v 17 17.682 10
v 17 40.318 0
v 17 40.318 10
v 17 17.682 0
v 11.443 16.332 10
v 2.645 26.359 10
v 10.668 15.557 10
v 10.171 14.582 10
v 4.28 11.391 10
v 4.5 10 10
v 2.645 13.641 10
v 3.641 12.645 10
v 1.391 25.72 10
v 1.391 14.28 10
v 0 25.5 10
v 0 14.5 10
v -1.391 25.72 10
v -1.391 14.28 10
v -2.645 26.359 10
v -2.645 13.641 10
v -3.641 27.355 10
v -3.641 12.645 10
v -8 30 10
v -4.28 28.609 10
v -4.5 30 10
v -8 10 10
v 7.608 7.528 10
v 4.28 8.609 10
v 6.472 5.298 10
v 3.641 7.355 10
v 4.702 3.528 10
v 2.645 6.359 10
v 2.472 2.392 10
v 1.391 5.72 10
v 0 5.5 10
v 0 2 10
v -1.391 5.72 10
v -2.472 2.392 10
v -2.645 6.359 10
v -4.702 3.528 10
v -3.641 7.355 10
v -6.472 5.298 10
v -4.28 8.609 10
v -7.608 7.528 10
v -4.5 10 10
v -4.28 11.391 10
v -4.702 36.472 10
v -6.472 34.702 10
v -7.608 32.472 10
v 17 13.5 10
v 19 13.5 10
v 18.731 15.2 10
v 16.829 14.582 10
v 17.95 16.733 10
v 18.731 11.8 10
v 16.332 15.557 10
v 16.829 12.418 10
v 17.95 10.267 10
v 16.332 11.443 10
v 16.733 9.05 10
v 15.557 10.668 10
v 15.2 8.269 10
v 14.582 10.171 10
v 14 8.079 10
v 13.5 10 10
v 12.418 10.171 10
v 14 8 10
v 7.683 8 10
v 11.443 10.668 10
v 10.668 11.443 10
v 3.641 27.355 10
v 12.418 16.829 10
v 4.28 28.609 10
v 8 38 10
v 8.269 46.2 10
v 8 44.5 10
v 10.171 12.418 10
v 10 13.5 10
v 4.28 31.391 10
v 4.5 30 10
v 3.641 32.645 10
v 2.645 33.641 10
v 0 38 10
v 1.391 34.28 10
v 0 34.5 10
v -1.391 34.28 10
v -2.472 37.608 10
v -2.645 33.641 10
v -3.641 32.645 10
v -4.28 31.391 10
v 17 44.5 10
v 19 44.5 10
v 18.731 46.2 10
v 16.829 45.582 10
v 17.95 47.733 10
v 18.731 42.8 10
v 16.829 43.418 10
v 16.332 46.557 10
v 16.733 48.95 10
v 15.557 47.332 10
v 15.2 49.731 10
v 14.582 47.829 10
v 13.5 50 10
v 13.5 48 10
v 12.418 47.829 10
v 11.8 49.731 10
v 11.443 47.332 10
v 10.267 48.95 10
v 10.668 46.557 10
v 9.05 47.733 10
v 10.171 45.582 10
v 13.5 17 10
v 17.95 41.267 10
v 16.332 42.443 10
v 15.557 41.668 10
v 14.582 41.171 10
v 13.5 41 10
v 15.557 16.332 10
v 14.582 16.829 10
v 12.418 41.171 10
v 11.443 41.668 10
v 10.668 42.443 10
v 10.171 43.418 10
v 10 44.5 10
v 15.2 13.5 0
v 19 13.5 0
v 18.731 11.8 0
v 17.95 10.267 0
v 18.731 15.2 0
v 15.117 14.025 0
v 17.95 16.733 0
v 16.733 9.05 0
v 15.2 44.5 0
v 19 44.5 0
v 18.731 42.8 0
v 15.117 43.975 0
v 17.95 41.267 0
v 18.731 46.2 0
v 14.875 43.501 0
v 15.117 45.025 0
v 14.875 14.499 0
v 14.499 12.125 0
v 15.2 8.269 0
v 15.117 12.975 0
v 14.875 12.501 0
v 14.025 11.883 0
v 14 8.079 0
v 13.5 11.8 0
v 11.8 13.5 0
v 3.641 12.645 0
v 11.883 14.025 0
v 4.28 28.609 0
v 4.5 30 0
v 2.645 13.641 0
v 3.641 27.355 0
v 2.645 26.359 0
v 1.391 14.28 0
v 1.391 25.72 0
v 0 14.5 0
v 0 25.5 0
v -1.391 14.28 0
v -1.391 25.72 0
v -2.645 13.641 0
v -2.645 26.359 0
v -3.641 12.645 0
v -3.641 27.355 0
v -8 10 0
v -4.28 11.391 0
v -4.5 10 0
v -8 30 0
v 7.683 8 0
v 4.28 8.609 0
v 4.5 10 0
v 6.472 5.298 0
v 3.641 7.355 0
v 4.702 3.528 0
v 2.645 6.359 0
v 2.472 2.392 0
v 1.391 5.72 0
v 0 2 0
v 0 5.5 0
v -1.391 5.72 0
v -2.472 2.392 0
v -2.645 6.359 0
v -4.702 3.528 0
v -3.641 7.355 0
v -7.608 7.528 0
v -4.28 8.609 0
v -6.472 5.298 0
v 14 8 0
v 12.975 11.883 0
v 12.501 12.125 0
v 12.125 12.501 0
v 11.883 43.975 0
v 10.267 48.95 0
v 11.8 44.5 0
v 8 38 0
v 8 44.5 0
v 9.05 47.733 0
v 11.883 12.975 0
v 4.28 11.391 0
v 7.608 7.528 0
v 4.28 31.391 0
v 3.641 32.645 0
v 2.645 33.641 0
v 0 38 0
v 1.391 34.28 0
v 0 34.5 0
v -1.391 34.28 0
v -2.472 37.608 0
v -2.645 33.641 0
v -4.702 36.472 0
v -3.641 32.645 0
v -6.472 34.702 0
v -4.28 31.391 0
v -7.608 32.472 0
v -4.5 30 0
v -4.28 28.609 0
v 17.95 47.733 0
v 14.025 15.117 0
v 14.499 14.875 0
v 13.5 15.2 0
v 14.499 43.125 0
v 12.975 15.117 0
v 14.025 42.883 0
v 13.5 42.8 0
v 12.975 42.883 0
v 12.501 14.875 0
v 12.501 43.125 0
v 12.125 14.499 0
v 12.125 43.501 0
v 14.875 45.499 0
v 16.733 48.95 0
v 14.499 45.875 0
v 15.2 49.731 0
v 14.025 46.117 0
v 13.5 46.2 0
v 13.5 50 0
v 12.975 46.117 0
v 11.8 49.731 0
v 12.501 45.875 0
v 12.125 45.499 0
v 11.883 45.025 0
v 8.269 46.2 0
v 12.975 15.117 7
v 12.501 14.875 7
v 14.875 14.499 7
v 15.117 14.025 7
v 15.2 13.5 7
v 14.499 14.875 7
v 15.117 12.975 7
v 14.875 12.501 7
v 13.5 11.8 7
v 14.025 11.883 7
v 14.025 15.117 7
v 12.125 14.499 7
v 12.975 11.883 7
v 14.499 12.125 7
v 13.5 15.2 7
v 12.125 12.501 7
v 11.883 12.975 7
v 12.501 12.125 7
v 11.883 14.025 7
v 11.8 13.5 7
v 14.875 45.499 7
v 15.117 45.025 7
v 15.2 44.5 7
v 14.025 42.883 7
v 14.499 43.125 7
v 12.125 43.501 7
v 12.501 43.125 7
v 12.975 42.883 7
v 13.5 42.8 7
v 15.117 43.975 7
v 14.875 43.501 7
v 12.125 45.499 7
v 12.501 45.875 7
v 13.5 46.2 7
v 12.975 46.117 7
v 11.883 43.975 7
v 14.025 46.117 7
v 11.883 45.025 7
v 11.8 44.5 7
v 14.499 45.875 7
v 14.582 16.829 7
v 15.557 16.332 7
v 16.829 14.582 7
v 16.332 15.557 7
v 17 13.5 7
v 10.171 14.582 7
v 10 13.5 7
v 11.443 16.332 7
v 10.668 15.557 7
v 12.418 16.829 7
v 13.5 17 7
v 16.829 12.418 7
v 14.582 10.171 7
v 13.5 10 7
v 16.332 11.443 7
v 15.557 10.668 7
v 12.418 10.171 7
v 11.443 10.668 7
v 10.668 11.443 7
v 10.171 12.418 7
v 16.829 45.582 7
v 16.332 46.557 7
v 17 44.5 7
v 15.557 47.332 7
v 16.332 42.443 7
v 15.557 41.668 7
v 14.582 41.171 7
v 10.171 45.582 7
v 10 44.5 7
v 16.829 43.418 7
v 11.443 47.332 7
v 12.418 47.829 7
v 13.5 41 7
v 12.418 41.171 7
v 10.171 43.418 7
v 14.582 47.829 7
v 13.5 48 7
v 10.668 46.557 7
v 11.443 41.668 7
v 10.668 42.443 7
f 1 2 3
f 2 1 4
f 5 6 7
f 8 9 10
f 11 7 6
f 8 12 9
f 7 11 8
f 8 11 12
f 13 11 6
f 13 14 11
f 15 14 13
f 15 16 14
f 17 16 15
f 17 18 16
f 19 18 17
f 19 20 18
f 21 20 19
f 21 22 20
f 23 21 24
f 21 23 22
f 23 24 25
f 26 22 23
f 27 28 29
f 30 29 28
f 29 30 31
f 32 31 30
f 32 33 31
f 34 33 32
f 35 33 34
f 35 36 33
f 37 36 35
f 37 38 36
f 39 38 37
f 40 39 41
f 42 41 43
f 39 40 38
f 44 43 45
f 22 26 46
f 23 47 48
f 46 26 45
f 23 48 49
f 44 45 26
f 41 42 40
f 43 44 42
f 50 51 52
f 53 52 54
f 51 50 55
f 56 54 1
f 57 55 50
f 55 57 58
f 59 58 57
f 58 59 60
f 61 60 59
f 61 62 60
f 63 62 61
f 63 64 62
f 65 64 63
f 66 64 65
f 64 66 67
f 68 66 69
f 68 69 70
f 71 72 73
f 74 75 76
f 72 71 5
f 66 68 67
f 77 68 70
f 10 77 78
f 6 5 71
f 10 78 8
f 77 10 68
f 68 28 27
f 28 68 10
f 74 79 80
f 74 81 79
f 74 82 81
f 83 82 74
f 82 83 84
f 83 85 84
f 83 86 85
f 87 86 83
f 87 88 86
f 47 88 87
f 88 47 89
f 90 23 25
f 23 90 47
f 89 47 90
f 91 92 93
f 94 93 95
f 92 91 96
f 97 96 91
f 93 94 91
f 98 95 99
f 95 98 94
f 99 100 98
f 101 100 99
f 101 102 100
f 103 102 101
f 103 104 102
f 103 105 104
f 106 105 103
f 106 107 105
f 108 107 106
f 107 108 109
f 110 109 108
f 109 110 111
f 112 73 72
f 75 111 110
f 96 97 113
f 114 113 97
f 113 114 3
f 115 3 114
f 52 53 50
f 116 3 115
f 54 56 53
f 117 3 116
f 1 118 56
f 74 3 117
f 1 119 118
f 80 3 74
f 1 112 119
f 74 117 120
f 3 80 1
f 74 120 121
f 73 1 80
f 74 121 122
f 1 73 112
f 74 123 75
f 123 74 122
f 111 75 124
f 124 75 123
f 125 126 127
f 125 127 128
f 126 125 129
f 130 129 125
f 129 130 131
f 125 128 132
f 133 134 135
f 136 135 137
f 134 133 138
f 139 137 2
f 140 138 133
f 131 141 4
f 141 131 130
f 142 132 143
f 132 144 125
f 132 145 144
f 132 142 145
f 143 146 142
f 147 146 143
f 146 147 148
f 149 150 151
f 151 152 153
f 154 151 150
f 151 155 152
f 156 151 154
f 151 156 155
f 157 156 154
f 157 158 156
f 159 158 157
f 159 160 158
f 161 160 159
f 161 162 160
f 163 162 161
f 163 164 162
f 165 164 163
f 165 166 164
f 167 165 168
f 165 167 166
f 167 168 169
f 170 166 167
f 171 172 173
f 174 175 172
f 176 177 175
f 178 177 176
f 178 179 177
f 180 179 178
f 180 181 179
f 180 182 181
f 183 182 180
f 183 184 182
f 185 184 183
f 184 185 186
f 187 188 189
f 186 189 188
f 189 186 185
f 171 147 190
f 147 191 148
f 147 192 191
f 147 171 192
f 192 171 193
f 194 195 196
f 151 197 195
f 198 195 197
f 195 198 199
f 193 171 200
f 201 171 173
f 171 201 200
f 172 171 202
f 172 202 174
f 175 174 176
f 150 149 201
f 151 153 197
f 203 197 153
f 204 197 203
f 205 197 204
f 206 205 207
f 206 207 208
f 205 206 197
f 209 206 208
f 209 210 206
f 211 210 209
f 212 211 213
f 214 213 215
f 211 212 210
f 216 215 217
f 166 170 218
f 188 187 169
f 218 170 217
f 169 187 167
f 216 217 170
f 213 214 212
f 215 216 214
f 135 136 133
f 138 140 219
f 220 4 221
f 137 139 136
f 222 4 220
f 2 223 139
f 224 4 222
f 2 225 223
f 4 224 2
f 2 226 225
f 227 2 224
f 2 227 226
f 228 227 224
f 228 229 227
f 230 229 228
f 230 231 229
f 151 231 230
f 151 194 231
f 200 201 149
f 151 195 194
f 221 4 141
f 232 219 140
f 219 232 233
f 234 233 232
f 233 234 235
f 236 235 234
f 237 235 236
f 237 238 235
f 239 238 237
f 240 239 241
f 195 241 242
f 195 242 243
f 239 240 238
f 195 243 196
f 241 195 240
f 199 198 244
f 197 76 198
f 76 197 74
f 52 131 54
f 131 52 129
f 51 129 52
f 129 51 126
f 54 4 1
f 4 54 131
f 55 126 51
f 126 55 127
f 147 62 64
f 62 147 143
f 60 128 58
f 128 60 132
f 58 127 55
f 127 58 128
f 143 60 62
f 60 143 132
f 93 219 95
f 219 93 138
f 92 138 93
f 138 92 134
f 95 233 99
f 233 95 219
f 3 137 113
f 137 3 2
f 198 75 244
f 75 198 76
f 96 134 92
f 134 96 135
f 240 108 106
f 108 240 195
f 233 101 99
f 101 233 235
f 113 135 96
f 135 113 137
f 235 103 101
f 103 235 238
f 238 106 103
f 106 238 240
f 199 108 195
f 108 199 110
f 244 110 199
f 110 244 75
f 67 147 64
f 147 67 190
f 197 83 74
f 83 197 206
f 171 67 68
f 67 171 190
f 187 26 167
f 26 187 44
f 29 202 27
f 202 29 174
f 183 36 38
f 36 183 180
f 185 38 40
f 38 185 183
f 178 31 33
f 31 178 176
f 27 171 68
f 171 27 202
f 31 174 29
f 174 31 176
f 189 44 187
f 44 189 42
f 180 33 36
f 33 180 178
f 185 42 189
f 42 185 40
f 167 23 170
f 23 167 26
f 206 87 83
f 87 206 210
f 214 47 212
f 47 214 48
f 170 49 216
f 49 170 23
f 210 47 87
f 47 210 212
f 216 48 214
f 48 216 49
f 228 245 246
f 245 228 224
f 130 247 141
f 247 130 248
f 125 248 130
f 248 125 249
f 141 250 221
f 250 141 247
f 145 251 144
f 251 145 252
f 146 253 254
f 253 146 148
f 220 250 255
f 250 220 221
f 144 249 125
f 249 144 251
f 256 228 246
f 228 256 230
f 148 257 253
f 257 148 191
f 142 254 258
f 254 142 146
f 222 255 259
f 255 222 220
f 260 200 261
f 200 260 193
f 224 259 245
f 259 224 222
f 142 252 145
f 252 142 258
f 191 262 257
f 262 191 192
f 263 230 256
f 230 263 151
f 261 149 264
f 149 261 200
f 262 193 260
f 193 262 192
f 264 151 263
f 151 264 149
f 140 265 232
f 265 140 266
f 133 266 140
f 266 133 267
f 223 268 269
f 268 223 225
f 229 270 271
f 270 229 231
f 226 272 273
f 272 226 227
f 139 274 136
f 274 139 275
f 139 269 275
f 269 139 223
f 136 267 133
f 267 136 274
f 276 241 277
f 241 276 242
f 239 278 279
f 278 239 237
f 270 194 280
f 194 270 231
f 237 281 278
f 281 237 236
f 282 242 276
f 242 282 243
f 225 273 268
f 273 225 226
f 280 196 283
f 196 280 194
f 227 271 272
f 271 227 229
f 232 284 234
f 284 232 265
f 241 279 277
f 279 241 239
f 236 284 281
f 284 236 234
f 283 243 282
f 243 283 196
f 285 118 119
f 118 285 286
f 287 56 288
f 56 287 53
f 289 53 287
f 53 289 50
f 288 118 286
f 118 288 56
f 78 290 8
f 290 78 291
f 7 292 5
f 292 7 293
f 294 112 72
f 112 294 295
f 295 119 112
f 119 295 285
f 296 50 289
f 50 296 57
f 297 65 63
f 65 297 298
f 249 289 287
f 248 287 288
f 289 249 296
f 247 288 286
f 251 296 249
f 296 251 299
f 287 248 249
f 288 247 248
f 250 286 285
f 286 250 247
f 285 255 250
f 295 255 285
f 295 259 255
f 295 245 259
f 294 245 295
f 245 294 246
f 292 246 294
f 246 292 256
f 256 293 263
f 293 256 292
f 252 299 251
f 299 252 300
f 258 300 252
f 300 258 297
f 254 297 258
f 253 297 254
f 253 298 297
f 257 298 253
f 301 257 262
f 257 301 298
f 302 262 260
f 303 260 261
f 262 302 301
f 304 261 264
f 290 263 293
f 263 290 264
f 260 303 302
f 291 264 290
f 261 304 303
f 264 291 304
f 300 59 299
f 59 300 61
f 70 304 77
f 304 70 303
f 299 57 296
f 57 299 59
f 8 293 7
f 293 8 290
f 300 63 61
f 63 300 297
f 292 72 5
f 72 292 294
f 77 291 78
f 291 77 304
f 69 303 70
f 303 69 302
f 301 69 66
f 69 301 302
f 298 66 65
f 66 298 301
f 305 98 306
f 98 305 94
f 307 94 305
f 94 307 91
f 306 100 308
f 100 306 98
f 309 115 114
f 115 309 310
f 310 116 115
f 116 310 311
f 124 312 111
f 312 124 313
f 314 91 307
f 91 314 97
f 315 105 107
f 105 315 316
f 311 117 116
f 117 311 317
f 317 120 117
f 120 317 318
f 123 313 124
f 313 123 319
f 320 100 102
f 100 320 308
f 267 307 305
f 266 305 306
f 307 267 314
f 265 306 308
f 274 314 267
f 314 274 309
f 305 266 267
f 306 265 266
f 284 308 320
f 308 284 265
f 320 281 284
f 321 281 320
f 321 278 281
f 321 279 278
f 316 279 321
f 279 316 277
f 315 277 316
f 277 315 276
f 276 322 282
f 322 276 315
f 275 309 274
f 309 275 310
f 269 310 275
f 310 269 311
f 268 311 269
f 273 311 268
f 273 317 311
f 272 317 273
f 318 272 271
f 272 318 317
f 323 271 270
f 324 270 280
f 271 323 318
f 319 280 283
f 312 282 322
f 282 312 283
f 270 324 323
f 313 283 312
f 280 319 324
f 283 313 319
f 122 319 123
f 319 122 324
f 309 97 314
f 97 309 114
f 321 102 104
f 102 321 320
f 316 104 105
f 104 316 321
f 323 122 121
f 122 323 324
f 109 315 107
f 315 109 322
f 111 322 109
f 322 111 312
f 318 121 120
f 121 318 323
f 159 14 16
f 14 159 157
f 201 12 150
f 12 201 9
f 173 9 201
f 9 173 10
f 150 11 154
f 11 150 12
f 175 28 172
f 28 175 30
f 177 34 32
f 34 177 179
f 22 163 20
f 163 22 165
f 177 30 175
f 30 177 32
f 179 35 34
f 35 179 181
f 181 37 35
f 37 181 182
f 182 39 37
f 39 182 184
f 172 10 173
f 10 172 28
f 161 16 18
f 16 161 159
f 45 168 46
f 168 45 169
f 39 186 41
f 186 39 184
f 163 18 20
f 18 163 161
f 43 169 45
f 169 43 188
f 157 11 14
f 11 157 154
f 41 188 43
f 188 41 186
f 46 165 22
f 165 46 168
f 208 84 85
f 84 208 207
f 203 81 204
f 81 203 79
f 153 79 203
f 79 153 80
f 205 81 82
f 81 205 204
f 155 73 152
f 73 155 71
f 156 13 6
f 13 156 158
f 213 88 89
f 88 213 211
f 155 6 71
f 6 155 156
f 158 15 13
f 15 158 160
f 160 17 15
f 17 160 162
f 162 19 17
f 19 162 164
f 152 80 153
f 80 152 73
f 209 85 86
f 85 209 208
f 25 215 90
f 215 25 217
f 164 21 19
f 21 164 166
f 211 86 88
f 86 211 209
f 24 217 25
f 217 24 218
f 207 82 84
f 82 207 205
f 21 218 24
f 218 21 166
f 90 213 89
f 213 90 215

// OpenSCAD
// PRUSA iteration3
// Y motor mount
// GNU GPL v3
// Josef Průša <iam@josefprusa.cz> and contributors
// http://www.reprap.org/wiki/Prusa_Mendel
// http://prusamendel.org

//include <configuration.scad>

$fn=20;

module y_motor_base(){
 // Motor holding part
 translate(v = [29,-21+50,0]){
  translate(v = [-21+4.5,0,5]) cube(size = [9,31,10], center=true);
  translate(v = [-15.5,-15.5,0]) cylinder(h = 10, r=5.5);
  translate(v = [-15.5,+15.5,0]) cylinder(h = 10, r=5.5);
  // Joins motor holder and rod plate
  translate(v = [-29,-21,0]) cube(size = [14,30,10]);
 }
 // Front holding part
 translate(v = [0,10,0]) cylinder(h = 10, r=8);
 translate(v = [0,20,5])cube(size = [16,20,10], center=true);	
 translate(v = [0,30,0])cylinder(h = 10, r=8);
}

module y_motor_holes(){
 translate(v = [29,-21+50,0]){
  // Screw head holes
  translate(v = [-15.5,-15.5,-1]) cylinder(h = 10, r=1.7);
  translate(v = [-15.5,+15.5,-1]) cylinder(h = 10, r=1.7);
  // Screw holes
  translate(v = [-15.5,-15.5,7]) cylinder(h = 7, r=3.5);
  translate(v = [-15.5,+15.5,7]) cylinder(h = 7, r=3.5);
 }
 translate(v = [0,10,-1]) cylinder(h = 12, r=4.5);	
 translate(v = [0,30,-1]) cylinder(h = 12, r=4.5);
}

// Final part
module y_motor(){
 difference(){
  y_motor_base();
  y_motor_holes();
 }
}

y_motor();
